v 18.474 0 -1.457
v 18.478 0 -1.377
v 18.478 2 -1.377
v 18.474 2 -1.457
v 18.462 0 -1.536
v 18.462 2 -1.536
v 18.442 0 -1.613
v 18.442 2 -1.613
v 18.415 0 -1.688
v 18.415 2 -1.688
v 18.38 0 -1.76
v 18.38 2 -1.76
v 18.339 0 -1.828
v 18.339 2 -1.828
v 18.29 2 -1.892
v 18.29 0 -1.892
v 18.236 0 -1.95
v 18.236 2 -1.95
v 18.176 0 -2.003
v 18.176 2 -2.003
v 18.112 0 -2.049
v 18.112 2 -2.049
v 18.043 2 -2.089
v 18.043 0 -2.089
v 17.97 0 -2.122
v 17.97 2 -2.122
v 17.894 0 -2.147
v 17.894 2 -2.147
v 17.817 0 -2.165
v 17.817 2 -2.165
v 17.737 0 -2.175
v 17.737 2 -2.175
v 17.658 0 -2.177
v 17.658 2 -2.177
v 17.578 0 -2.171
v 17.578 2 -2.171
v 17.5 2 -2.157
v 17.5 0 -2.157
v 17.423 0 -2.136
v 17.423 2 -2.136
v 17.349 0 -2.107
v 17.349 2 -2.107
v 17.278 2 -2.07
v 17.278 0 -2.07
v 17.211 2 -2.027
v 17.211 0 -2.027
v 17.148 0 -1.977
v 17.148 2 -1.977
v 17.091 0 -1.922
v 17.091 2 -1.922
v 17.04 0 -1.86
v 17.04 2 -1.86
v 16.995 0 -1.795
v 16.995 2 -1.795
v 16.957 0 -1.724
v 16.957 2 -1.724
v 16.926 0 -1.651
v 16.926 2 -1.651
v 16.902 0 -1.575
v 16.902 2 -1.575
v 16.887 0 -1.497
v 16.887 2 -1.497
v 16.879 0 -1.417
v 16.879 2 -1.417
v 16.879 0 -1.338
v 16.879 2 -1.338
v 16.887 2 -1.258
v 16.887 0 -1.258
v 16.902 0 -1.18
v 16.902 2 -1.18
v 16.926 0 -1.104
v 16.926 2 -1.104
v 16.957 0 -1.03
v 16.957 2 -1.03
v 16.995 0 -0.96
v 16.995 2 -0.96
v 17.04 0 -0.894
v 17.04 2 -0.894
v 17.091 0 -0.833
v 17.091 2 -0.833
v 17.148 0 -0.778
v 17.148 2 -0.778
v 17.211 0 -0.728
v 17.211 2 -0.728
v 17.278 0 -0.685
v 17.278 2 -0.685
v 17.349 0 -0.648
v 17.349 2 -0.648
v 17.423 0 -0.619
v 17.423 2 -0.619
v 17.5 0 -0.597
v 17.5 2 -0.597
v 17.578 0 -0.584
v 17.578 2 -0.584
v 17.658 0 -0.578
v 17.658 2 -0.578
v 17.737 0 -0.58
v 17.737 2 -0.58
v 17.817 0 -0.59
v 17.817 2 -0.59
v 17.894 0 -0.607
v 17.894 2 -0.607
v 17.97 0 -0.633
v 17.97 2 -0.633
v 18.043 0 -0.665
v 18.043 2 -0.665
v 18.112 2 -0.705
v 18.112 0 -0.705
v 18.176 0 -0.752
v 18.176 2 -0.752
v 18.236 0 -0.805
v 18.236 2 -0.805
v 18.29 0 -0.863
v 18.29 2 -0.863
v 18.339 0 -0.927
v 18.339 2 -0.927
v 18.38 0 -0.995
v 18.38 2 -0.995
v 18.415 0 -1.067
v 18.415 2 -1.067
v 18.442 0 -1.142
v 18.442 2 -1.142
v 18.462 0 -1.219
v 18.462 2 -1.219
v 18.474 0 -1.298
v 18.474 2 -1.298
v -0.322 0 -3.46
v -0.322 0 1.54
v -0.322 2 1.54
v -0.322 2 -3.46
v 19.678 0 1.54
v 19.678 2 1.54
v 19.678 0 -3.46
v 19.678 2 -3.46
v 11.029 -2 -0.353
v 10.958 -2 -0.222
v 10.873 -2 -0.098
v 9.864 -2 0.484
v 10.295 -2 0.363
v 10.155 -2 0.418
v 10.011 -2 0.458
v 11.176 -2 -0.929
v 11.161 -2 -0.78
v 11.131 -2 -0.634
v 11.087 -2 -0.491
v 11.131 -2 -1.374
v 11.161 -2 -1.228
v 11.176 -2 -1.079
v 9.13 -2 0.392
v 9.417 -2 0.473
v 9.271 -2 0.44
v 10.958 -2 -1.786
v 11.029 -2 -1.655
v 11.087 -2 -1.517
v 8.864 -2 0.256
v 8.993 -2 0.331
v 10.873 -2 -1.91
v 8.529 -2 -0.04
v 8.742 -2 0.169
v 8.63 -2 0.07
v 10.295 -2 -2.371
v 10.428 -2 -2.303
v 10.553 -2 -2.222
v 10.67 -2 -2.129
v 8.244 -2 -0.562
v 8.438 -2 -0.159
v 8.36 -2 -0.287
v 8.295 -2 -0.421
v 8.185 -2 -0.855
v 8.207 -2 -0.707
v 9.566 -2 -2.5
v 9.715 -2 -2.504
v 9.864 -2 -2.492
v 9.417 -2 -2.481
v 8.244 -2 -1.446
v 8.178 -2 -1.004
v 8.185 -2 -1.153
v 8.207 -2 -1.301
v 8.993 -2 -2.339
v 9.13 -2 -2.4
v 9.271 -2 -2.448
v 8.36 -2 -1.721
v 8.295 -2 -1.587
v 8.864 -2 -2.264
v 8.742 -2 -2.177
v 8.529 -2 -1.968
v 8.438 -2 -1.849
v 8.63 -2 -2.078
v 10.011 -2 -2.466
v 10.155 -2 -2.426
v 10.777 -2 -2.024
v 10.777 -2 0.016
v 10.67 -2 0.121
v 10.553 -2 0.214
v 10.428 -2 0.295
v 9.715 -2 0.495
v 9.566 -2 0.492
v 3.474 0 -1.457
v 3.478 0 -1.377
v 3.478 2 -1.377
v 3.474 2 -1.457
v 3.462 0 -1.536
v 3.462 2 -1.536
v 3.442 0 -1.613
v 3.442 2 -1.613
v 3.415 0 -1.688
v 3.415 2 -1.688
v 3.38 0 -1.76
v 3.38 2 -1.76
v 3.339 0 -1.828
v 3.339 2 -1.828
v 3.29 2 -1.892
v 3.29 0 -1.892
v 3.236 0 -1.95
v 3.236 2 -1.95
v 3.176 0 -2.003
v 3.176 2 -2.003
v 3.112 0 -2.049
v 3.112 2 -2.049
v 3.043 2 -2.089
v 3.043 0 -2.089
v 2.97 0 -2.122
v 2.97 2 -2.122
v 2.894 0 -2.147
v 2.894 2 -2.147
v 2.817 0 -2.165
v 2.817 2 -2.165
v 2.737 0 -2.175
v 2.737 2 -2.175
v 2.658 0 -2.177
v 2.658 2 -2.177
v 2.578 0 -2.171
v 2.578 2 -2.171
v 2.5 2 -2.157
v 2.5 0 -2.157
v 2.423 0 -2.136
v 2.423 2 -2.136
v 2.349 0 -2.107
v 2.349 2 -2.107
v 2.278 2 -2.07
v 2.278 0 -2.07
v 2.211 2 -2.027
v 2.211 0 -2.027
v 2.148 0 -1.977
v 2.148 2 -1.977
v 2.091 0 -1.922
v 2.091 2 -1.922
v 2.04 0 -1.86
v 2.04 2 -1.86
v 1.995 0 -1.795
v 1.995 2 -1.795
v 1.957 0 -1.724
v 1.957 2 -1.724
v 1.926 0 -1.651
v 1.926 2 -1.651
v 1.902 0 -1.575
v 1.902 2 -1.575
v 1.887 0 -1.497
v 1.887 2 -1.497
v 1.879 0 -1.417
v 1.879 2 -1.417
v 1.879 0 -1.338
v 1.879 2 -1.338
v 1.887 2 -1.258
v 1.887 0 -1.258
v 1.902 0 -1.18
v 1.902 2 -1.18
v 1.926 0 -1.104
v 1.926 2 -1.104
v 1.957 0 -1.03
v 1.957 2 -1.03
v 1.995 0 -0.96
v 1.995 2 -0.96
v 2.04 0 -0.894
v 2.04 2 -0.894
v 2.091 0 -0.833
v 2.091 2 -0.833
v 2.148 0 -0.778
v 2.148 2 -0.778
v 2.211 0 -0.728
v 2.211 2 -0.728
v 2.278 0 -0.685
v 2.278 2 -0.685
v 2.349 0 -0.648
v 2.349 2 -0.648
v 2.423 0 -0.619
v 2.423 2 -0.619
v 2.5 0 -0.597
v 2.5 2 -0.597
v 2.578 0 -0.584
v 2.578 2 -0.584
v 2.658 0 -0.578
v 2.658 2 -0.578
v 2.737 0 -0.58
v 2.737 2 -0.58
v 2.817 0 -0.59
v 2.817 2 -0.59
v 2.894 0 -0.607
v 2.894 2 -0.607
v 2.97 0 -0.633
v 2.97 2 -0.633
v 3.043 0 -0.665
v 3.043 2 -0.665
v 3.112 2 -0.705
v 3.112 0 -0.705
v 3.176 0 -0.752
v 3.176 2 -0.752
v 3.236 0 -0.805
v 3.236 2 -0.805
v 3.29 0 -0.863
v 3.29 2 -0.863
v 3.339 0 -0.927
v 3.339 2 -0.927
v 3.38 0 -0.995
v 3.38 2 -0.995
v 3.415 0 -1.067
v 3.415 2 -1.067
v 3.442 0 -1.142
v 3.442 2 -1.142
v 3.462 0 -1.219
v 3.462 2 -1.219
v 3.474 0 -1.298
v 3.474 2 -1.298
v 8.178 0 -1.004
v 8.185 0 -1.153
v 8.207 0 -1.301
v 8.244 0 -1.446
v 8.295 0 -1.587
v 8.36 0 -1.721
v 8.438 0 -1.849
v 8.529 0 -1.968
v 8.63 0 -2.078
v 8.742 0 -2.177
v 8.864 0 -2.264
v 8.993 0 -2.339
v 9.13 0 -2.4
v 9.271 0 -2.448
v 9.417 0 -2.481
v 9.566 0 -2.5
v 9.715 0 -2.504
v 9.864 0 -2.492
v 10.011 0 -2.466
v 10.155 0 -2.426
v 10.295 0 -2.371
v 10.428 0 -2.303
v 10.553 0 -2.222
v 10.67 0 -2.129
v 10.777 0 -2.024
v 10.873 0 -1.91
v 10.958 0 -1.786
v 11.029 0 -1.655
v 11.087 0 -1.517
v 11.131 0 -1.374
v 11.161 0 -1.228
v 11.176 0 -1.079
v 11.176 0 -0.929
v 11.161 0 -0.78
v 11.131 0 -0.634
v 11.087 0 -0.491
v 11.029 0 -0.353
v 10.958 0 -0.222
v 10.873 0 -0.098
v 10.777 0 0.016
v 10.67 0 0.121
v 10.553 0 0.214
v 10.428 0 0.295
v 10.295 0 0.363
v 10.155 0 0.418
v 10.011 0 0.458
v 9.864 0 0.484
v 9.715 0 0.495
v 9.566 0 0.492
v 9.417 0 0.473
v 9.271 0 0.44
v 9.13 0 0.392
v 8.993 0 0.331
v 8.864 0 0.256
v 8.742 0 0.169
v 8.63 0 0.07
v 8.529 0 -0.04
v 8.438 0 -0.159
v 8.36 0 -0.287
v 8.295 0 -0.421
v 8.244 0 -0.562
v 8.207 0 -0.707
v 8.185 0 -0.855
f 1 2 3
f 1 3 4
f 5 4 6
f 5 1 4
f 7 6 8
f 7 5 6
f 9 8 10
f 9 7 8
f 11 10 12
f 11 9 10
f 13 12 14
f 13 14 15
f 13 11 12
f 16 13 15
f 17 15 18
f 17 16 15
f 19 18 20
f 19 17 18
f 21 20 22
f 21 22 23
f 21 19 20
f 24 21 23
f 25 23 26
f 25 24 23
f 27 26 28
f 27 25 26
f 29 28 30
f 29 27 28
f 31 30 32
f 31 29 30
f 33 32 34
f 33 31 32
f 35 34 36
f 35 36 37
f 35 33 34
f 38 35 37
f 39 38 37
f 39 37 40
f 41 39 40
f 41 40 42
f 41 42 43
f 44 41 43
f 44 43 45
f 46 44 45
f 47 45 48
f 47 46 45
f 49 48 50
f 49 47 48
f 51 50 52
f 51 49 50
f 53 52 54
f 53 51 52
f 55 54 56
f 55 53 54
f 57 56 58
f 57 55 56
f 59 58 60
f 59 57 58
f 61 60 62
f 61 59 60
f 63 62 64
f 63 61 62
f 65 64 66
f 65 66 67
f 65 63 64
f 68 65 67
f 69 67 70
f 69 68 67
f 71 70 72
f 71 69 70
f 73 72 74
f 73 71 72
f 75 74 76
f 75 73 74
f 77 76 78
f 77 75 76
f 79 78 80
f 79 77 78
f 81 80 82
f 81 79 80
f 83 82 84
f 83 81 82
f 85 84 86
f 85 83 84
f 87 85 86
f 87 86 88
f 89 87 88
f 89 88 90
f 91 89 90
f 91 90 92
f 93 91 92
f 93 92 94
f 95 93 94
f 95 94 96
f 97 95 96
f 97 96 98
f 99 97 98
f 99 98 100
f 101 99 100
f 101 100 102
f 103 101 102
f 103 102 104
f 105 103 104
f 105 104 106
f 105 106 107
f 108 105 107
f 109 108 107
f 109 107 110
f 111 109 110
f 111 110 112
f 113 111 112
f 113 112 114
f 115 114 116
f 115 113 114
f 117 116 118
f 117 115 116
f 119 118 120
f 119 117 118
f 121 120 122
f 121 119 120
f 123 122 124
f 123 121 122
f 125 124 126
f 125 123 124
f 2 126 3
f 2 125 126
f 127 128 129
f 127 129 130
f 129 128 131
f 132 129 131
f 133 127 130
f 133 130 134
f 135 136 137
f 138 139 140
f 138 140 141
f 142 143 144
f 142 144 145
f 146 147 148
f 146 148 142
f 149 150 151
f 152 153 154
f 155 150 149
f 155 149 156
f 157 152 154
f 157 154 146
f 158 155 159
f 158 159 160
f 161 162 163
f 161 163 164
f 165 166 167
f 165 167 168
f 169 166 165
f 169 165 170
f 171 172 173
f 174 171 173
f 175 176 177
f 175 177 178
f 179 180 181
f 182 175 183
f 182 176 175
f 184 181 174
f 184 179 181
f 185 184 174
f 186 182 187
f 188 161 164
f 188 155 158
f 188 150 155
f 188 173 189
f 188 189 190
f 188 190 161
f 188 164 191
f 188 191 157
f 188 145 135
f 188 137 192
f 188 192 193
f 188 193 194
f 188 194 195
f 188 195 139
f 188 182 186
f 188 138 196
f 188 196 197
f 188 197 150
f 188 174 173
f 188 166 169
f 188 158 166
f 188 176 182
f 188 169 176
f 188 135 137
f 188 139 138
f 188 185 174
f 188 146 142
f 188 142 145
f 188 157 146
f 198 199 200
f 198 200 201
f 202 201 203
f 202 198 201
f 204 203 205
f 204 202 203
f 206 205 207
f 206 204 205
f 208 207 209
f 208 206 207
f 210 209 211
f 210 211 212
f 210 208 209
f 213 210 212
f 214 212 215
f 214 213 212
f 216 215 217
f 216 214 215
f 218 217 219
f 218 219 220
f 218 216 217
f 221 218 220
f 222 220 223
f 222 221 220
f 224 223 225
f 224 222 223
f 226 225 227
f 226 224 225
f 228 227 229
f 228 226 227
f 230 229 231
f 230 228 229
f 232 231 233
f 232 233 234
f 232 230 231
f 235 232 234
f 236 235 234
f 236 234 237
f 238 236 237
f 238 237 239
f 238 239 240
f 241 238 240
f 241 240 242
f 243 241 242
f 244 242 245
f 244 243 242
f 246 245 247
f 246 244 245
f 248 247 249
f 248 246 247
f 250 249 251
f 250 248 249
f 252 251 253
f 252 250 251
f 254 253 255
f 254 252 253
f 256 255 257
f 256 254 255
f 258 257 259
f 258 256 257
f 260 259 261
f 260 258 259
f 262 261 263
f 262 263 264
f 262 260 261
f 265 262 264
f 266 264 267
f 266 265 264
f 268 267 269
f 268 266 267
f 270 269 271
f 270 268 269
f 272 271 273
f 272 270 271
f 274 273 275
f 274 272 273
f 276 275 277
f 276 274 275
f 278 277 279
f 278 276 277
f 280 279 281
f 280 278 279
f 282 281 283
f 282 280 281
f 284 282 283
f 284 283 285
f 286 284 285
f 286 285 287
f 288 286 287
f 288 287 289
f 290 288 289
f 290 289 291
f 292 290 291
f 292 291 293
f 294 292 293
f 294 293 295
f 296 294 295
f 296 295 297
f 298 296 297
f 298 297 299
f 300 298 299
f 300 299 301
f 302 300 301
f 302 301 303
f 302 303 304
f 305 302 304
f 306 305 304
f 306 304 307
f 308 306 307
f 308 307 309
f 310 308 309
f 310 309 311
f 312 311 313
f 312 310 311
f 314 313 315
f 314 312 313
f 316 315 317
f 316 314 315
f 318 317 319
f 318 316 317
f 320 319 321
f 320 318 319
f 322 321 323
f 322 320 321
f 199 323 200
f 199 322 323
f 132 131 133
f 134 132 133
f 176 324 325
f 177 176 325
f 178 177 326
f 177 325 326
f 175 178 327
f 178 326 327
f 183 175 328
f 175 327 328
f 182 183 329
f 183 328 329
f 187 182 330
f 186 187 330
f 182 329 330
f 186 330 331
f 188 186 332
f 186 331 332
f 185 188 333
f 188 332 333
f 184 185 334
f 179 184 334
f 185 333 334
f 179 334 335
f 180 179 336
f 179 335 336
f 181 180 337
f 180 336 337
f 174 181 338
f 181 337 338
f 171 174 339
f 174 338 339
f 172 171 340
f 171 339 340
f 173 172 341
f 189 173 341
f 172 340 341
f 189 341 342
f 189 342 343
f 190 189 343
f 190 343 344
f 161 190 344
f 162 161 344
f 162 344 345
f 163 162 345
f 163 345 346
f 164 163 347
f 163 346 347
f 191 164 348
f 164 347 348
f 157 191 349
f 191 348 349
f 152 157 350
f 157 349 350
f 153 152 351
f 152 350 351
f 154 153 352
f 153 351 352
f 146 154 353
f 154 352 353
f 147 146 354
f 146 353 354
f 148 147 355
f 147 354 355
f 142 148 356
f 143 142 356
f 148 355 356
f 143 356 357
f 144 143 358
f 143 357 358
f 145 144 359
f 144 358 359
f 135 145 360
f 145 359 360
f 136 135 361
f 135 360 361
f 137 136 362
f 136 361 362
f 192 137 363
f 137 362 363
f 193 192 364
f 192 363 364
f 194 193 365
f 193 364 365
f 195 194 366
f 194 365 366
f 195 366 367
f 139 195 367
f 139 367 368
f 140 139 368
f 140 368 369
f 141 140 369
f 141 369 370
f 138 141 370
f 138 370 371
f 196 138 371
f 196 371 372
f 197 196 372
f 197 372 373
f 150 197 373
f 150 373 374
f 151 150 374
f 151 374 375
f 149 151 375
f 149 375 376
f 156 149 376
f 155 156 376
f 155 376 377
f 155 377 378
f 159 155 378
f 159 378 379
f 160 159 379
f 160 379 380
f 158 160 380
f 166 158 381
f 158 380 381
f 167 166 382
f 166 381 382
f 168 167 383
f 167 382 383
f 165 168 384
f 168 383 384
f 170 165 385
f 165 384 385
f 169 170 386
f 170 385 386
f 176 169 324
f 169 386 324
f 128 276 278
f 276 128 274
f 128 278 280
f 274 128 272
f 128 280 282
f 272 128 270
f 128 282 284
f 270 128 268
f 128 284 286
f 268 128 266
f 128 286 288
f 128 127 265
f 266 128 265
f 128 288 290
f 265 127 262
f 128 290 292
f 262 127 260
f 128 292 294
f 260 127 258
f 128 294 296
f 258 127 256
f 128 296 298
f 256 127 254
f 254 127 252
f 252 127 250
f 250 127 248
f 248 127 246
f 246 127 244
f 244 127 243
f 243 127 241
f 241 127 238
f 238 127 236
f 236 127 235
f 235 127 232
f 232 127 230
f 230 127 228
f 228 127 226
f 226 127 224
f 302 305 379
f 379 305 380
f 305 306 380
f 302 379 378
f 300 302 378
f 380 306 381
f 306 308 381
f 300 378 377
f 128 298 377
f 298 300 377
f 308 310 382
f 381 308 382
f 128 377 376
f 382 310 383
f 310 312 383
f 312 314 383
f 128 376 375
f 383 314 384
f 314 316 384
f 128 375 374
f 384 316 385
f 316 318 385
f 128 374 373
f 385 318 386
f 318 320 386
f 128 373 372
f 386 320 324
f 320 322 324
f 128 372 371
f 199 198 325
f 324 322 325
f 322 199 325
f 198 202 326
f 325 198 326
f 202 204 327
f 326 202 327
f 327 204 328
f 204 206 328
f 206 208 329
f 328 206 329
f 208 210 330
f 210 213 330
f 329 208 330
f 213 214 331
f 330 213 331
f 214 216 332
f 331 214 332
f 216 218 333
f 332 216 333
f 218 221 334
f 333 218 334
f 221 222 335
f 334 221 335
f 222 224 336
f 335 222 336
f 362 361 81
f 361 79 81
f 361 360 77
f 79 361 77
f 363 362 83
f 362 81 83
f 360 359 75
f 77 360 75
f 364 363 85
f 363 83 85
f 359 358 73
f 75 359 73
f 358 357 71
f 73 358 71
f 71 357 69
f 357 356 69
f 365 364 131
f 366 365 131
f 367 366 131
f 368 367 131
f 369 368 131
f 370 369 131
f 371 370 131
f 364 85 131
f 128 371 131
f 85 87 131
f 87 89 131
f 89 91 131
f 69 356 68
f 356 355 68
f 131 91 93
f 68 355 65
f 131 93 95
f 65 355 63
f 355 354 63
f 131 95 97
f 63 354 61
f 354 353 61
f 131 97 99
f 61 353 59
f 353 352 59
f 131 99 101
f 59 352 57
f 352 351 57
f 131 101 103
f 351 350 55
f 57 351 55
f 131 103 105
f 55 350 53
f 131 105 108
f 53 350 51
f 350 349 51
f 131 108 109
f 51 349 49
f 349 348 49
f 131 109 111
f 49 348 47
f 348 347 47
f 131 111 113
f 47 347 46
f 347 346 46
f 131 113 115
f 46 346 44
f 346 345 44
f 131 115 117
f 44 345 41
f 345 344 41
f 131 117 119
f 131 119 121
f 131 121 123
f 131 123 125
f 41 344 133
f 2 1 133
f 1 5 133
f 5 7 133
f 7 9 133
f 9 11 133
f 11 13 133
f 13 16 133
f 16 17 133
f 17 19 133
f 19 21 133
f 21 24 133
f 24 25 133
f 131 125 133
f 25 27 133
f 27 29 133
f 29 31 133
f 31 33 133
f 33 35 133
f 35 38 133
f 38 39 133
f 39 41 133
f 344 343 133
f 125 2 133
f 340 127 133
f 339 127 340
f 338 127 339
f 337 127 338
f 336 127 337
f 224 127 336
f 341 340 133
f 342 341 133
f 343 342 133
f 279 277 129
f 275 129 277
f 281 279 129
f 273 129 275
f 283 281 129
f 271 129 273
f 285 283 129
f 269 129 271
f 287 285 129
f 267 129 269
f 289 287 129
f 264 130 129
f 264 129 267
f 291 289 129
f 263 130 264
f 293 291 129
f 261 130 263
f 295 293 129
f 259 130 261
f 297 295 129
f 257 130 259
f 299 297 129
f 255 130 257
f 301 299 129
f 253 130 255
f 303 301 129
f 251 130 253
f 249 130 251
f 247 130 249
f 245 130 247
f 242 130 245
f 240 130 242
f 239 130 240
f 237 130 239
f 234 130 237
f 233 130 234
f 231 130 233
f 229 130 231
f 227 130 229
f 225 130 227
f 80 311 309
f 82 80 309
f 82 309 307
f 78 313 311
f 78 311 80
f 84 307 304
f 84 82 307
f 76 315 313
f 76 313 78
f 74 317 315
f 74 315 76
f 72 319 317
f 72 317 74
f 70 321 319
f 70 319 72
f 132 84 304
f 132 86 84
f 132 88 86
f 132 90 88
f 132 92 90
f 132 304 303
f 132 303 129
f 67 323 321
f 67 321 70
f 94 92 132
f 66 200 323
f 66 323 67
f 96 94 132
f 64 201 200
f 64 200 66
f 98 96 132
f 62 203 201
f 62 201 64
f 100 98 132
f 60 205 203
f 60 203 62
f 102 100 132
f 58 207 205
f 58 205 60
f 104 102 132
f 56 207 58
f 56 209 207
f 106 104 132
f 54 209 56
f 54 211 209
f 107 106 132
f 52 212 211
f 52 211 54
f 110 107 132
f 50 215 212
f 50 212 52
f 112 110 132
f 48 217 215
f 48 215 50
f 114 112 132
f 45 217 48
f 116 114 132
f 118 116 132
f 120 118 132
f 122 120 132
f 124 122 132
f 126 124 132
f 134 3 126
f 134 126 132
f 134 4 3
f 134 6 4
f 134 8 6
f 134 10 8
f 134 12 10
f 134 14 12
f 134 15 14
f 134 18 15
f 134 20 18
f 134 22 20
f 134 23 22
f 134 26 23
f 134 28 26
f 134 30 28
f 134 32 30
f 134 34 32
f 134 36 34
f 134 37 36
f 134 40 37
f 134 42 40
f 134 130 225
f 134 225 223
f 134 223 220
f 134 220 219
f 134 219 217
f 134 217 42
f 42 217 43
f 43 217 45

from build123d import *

# Parameters (mm, degrees)
SKETCH1_W           = 20
SKETCH1_H           = 5
SKETCH1_R           = 0.8
BOSS_EXTRUDE1_DEPTH = 2
SKETCH2_R           = 1.5
BOSS_EXTRUDE2_DEPTH = 2


with BuildPart() as part:
    # Sketch1 → Boss-Extrude1 (new body)
    with BuildSketch(Plane(origin=(0, 0, 0), x_dir=(1, 0, 0), z_dir=(0, 1, 0))):
        with Locations((9.677629379, 0.960024777)):
            Rectangle(SKETCH1_W, SKETCH1_H)
        with Locations((17.677629379, 1.377386897)):
            Circle(SKETCH1_R, mode=Mode.SUBTRACT)
        with Locations((2.677629379, 1.377386897)):
            Circle(SKETCH1_R, mode=Mode.SUBTRACT)
    extrude(amount=BOSS_EXTRUDE1_DEPTH)

    # Sketch2 → Boss-Extrude2 (add)
    with BuildSketch(Plane(origin=(0, 0, 0), x_dir=(-1, 0, 0), z_dir=(0, -1, 0))):
        with Locations((-9.677629379, 1.004049849)):
            Circle(SKETCH2_R)
    extrude(amount=BOSS_EXTRUDE2_DEPTH)


solid = part.part
